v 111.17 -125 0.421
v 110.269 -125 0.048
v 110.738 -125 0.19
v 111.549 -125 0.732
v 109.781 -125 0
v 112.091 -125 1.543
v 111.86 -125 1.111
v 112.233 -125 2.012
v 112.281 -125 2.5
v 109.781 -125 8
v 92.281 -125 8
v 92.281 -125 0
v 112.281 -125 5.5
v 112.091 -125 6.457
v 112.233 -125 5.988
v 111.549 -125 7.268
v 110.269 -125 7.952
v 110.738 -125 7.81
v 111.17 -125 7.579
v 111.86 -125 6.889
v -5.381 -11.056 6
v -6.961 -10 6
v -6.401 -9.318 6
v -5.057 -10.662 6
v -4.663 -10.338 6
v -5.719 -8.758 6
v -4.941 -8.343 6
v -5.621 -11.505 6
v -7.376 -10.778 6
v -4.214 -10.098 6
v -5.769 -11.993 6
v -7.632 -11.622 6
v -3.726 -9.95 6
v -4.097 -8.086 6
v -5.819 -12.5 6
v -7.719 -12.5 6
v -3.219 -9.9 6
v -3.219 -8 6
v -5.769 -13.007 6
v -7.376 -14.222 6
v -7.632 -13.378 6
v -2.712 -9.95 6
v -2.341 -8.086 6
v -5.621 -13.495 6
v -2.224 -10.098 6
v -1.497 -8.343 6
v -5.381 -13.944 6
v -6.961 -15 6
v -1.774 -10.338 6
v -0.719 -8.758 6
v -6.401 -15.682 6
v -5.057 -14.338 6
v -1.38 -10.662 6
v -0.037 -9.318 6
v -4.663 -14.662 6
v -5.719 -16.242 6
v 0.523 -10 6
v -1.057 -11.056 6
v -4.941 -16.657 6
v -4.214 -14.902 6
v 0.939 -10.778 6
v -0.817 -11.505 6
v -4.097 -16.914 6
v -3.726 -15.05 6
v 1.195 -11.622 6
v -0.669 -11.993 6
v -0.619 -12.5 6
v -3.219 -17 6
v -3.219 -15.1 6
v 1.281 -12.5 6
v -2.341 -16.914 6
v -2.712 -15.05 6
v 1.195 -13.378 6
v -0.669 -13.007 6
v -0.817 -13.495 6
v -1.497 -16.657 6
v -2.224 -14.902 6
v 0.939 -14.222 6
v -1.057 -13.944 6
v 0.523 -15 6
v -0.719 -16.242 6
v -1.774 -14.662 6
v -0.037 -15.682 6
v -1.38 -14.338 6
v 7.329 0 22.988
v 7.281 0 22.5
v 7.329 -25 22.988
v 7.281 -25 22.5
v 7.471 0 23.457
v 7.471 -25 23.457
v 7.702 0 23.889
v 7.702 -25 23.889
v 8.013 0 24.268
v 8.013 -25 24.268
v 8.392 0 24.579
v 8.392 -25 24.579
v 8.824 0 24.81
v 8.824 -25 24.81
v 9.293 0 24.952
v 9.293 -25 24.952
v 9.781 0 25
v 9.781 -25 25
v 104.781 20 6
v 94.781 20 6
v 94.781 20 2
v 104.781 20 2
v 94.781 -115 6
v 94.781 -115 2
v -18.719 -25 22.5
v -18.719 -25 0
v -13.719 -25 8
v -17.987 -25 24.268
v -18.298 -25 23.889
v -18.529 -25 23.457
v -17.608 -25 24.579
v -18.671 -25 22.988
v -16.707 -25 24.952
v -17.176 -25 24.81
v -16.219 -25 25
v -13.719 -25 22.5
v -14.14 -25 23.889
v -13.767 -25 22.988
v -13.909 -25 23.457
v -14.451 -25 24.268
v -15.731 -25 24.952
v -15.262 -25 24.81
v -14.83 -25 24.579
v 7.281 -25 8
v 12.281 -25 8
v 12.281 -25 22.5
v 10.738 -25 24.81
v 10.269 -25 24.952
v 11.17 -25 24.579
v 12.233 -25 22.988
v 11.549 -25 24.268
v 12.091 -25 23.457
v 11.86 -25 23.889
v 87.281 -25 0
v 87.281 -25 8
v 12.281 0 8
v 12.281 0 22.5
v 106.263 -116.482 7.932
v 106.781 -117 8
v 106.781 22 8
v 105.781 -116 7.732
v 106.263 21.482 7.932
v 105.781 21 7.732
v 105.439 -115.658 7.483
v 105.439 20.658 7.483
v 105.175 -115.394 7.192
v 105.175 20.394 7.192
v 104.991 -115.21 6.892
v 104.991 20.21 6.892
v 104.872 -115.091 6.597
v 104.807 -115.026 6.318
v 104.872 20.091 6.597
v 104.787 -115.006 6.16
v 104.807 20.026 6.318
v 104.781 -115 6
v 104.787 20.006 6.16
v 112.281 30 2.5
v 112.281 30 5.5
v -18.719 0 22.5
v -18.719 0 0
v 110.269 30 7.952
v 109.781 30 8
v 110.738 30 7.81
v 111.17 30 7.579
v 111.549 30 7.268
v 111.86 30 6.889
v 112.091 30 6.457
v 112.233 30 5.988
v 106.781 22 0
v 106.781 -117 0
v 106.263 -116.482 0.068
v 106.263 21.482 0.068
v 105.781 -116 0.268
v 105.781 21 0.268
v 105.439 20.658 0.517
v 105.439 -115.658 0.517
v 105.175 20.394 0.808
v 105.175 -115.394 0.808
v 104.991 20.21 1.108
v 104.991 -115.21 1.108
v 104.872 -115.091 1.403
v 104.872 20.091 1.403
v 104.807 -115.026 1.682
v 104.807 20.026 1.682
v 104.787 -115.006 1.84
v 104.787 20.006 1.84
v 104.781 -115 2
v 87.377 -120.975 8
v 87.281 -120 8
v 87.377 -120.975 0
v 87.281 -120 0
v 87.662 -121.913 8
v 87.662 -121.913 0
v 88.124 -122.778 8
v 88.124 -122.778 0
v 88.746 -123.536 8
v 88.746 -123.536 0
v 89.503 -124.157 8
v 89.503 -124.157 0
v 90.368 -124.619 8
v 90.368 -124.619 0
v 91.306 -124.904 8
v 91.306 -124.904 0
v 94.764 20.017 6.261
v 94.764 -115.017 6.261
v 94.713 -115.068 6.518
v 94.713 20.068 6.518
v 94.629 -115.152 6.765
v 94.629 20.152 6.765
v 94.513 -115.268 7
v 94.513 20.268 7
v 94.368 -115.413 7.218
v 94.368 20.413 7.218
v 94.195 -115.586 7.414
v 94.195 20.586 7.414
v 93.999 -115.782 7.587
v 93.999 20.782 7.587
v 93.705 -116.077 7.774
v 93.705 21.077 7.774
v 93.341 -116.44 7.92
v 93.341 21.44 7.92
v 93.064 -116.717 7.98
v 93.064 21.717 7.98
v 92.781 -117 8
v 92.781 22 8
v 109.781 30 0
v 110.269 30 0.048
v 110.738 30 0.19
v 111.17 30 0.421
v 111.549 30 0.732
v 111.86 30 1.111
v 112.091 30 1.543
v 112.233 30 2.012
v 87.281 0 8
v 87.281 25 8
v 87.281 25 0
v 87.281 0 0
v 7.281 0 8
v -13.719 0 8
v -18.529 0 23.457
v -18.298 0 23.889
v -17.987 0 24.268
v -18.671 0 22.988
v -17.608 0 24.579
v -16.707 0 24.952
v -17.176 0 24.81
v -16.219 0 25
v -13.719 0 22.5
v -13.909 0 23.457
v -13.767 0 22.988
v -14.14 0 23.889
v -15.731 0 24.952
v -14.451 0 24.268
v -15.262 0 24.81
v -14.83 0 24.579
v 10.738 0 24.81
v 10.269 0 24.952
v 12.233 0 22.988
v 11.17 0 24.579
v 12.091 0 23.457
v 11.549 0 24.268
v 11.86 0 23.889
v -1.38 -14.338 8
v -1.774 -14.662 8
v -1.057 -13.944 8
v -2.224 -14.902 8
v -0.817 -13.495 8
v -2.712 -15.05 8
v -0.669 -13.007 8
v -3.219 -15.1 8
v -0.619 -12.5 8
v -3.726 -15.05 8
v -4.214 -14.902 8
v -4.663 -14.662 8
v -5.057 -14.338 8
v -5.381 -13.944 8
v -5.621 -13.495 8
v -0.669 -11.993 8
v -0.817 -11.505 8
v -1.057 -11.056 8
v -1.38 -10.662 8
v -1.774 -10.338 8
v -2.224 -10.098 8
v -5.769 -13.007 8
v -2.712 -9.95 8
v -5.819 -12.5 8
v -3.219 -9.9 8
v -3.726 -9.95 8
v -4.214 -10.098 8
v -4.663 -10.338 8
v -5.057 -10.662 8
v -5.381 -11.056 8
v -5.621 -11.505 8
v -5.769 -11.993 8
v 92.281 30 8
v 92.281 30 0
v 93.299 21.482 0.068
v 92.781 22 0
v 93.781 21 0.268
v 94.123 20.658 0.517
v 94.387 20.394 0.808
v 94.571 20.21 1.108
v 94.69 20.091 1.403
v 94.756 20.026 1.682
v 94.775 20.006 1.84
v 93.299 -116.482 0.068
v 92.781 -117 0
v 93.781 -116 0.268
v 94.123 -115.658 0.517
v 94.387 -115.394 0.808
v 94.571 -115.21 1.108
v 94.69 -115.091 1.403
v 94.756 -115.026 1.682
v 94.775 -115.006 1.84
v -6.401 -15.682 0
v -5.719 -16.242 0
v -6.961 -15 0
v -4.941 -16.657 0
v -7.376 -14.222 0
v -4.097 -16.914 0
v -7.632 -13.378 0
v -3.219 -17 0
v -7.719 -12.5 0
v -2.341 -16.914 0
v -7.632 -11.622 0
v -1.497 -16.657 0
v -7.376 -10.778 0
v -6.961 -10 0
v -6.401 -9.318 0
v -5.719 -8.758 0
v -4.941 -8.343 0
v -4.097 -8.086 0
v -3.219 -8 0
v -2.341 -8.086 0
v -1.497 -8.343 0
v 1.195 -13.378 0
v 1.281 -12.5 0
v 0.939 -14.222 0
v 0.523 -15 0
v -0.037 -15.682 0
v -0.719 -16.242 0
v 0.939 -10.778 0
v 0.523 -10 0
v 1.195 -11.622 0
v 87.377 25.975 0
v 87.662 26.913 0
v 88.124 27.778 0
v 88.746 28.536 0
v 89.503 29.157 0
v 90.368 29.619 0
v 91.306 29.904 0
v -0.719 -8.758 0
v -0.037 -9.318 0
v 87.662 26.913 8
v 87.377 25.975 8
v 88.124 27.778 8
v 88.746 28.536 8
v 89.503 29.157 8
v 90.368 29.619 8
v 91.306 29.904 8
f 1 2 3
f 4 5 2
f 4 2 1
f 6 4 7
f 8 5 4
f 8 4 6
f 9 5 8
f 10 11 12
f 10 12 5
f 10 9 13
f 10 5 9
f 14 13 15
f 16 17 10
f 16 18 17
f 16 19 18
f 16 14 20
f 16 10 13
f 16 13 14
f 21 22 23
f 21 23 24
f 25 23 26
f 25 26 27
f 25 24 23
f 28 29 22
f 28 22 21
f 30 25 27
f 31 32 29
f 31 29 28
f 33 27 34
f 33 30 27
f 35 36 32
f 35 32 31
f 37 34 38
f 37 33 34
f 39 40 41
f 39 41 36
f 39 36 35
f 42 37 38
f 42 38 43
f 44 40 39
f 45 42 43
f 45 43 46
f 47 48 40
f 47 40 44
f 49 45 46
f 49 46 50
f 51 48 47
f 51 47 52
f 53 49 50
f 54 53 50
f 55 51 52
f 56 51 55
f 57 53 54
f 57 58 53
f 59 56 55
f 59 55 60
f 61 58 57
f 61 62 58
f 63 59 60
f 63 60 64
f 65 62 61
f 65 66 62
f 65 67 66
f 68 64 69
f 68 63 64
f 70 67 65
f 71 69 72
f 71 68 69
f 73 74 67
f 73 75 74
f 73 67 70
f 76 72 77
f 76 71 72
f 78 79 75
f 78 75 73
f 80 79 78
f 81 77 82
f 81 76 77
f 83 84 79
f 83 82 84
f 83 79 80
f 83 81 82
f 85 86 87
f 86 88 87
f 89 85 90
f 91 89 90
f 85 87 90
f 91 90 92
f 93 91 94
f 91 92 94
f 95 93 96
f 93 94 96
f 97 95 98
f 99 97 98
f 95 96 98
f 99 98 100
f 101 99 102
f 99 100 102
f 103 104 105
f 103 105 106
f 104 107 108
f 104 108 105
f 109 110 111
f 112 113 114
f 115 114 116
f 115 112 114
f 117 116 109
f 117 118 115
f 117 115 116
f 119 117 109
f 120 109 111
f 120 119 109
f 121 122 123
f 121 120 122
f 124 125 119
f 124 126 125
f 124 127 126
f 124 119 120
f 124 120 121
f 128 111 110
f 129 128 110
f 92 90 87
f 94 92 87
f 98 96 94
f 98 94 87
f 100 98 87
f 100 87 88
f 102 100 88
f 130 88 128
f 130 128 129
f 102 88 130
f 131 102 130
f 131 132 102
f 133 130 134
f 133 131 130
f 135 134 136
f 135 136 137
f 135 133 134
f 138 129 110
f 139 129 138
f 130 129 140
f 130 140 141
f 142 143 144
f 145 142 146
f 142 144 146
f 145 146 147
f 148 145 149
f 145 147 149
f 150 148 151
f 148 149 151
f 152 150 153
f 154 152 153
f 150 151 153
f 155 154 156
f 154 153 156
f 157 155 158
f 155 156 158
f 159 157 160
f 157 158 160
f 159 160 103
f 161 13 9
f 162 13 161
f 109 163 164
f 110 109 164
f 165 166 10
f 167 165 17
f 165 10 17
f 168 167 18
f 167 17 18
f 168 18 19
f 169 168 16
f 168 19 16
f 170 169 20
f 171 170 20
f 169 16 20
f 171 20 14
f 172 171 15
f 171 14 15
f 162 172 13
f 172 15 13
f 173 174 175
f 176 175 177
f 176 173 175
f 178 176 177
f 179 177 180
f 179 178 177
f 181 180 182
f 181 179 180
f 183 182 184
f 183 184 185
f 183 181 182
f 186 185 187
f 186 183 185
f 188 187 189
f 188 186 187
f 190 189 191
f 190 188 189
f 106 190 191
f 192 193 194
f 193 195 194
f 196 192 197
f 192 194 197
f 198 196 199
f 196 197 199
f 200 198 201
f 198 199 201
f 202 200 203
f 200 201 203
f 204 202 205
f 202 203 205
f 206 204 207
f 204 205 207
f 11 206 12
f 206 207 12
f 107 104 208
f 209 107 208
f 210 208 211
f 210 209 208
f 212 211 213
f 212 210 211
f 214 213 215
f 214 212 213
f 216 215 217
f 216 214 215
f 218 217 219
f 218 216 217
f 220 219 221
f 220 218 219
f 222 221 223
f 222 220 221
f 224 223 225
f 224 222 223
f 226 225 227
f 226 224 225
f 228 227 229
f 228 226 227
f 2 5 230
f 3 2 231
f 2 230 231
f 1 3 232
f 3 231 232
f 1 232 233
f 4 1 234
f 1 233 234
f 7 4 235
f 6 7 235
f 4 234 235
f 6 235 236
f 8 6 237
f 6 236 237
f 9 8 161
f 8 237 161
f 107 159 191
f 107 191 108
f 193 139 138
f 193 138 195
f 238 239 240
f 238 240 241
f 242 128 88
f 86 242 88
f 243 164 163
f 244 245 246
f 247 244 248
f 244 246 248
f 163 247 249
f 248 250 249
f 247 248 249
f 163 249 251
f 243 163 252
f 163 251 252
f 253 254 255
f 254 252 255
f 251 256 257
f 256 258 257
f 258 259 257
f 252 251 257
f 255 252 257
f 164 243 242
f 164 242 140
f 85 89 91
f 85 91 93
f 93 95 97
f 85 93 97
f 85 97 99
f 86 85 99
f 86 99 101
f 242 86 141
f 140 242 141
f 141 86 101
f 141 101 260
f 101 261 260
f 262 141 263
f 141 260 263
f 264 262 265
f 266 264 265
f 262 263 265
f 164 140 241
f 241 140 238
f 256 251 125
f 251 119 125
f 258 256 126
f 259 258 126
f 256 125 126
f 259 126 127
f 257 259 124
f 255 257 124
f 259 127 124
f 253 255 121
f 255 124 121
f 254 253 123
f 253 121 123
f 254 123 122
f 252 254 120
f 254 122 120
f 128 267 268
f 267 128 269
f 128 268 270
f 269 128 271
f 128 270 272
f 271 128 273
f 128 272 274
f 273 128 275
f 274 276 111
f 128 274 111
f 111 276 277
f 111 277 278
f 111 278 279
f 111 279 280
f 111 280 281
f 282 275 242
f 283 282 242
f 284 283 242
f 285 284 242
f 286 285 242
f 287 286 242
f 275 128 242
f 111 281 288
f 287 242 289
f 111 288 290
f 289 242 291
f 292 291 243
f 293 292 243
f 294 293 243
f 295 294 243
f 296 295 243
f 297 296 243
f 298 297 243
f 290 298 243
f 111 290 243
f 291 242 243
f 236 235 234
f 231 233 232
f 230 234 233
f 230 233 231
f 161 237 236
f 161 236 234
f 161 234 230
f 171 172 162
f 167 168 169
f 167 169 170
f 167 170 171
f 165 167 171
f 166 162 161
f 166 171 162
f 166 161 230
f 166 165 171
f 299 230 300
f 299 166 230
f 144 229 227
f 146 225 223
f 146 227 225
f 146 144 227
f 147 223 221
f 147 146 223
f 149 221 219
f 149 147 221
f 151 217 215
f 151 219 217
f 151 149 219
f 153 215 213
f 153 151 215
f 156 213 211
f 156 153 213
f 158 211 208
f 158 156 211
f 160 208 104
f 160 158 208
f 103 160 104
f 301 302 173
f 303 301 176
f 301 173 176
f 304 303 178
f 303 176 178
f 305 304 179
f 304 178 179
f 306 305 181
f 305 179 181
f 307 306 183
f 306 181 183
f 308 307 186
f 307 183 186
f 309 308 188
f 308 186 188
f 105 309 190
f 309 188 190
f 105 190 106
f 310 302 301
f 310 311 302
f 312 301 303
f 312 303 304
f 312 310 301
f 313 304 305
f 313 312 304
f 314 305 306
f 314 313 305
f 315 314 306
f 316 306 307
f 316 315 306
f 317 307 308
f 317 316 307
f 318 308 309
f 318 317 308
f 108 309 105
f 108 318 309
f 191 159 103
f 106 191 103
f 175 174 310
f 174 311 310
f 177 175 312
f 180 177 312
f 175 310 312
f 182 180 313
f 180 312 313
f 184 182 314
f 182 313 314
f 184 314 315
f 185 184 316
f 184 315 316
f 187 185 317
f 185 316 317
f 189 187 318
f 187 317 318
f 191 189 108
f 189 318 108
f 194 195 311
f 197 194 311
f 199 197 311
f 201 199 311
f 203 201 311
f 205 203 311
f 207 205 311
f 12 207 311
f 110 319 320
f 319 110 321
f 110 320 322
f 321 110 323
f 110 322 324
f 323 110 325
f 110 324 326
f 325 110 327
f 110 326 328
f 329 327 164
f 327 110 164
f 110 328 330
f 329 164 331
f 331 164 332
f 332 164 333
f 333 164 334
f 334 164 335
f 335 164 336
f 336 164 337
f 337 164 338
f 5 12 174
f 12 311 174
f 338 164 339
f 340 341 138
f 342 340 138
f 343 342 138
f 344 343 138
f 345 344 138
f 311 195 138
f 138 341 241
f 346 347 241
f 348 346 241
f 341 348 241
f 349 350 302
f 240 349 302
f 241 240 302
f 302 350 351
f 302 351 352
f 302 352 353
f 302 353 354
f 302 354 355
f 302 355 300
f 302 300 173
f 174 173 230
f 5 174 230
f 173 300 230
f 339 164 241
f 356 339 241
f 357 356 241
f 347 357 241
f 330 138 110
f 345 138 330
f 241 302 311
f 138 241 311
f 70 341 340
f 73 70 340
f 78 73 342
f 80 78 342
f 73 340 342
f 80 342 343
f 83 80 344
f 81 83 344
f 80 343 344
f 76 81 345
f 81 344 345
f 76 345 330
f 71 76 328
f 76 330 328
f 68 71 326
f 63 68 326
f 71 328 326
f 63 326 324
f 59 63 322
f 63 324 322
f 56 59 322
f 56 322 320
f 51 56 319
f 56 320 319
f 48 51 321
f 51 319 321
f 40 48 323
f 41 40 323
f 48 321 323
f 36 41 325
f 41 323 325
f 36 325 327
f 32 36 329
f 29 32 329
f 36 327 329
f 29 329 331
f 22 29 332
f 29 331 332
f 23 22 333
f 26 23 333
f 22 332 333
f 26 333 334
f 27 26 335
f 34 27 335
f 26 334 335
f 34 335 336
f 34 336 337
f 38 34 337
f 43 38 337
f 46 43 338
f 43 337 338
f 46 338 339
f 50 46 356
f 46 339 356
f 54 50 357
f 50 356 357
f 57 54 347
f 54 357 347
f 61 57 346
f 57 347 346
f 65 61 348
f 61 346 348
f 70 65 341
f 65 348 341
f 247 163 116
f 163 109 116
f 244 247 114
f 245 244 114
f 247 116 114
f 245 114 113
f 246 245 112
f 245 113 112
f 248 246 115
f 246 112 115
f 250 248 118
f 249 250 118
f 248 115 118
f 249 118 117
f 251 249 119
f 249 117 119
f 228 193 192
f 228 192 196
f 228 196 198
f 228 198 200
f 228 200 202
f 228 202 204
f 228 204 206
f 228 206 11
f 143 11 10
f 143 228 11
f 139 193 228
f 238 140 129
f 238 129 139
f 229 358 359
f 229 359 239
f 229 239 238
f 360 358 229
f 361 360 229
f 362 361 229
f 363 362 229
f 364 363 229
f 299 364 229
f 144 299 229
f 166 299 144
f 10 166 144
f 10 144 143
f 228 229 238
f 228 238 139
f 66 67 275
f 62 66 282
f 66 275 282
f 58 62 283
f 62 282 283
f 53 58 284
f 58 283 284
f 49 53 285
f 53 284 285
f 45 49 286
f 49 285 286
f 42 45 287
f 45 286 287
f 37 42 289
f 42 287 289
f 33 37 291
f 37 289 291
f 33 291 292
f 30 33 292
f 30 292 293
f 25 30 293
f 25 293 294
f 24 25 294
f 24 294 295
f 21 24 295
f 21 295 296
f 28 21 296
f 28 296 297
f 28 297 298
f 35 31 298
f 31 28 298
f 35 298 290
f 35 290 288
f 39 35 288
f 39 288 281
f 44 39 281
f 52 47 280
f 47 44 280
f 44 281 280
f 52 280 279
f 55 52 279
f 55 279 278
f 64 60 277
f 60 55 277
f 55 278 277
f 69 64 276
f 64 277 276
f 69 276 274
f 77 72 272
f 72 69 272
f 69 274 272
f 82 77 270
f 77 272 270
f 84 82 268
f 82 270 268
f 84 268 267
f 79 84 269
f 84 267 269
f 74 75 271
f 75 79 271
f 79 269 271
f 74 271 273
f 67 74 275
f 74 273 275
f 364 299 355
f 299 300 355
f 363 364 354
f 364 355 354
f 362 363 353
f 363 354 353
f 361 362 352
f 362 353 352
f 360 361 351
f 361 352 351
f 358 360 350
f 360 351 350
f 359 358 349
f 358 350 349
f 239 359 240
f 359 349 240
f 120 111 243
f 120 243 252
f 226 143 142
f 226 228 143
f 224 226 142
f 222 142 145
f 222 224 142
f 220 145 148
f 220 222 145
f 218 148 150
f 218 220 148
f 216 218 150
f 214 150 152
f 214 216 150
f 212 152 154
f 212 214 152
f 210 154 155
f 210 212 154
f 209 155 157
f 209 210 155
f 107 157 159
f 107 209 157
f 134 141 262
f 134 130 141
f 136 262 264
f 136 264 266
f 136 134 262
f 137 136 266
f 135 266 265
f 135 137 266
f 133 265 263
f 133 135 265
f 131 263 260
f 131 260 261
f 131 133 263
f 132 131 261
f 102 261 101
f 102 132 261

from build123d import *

# Parameters (mm, degrees)
F0_W      = 5
F0_H      = 17
F0_H_2    = 8
F0_W_2    = 21
F0_W_3    = 100
F1_DEPTH  = 25
F3_DEPTH  = 8
F4_R      = 2.5
F5_R      = 2.49999
F6_R      = 2.6
F7_DEPTH  = 25
F8_R      = 5
F9_R      = 4.5
F9_R_2    = 2.6
F10_DEPTH = 6
F2_W      = 10
F2_H      = 25
F11_DEPTH = 25
F12_R     = 2


# Not quite as in the source:
# - a fillet or chamfer is up to 0.001 mm smaller than in the source, because OpenCascade refuses the exact size


with BuildPart() as f1:
    # F0 (on Front) → F1 (new body)
    with BuildSketch(Plane.XZ):
        with Locations((-16.2189533483, 16.5)):
            Rectangle(F0_W, F0_H)
        with Locations((-16.2189533483, 4)):
            Rectangle(F0_W, F0_H_2)
        with Locations((-3.2189533483, 4)):
            Rectangle(F0_W_2, F0_H_2)
        with Locations((9.7810466517, 4)):
            Rectangle(F0_W, F0_H_2)
        with Locations((9.7810466517, 16.5)):
            Rectangle(F0_W, F0_H)
        with Locations((62.2810466517, 4)):
            Rectangle(F0_W_3, F0_H_2)
    extrude(amount=F1_DEPTH)

    # F2 (on face) → F3 (join)
    with BuildSketch(Plane.XY.offset(8)):
        Polygon((87.2810466517, -125), (112.2810466517, -125), (112.2810466517, -25), (104.7810466517, -25), (104.7810466517, -115), (94.7810466517, -115), (94.7810466517, -25), (87.2810466517, -25), align=None)
        Polygon((104.7810466517, 0), (112.2810466517, 0), (112.2810466517, 30), (87.2810466517, 30), (87.2810466517, 0), (94.7810466517, 0), (94.7810466517, 20), (104.7810466517, 20), align=None)
    extrude(amount=-F3_DEPTH)

    # F4
    f4_edges = [f1.edges().sort_by_distance(p)[0] for p in [
        (112.281047, -47.5, 0),
        (112.281047, -47.5, 8),
    ]]
    fillet(f4_edges, radius=F4_R)

    # F5 (radius 2.5 in the source; OpenCascade refuses exactly that, so slightly less here)
    f5_edges = [f1.edges().sort_by_distance(p)[0] for p in [
        (12.281047, -12.5, 25),
        (7.281047, -12.5, 25),
        (-18.718953, -12.5, 25),
        (-13.718953, -12.5, 25),
    ]]
    fillet(f5_edges, radius=F5_R)

    # F6 (on face) → F7 (cut)
    with BuildSketch(Plane.XY.offset(8)):
        with Locations((-3.2189533483, -12.5)):
            Circle(F6_R)
    extrude(amount=-F7_DEPTH, mode=Mode.SUBTRACT)

    # F8
    f8_edges = [f1.edges().sort_by_distance(p)[0] for p in [
        (87.281047, 30, 4),
        (87.281047, -125, 4),
    ]]
    fillet(f8_edges, radius=F8_R)

    # F9 (on face) → F10 (cut)
    with BuildSketch(Plane(origin=(0, 0, 0), x_dir=(1, 0, 0), z_dir=(0, 0, -1))):
        with Locations((-3.2189533483, 12.5)):
            Circle(F9_R)
        with Locations((-3.2189533483, 12.5)):
            Circle(F9_R_2, mode=Mode.SUBTRACT)
    extrude(amount=-F10_DEPTH, mode=Mode.SUBTRACT)

    # F2 (on face) → F11 (cut)
    with BuildSketch(Plane.XY.offset(8)):
        with Locations((99.7810466517, -12.5)):
            Rectangle(F2_W, F2_H)
    extrude(amount=-F11_DEPTH, mode=Mode.SUBTRACT)

    # F12
    f12_edges = [f1.edges().sort_by_distance(p)[0] for p in [
        (94.781047, -47.5, 8),
        (99.781047, 20, 8),
        (104.781047, -47.5, 8),
        (99.781047, -115, 8),
        (99.781047, 20, 0),
        (94.781047, -47.5, 0),
        (104.781047, -47.5, 0),
        (99.781047, -115, 0),
    ]]
    fillet(f12_edges, radius=F12_R)


solid = f1.part
